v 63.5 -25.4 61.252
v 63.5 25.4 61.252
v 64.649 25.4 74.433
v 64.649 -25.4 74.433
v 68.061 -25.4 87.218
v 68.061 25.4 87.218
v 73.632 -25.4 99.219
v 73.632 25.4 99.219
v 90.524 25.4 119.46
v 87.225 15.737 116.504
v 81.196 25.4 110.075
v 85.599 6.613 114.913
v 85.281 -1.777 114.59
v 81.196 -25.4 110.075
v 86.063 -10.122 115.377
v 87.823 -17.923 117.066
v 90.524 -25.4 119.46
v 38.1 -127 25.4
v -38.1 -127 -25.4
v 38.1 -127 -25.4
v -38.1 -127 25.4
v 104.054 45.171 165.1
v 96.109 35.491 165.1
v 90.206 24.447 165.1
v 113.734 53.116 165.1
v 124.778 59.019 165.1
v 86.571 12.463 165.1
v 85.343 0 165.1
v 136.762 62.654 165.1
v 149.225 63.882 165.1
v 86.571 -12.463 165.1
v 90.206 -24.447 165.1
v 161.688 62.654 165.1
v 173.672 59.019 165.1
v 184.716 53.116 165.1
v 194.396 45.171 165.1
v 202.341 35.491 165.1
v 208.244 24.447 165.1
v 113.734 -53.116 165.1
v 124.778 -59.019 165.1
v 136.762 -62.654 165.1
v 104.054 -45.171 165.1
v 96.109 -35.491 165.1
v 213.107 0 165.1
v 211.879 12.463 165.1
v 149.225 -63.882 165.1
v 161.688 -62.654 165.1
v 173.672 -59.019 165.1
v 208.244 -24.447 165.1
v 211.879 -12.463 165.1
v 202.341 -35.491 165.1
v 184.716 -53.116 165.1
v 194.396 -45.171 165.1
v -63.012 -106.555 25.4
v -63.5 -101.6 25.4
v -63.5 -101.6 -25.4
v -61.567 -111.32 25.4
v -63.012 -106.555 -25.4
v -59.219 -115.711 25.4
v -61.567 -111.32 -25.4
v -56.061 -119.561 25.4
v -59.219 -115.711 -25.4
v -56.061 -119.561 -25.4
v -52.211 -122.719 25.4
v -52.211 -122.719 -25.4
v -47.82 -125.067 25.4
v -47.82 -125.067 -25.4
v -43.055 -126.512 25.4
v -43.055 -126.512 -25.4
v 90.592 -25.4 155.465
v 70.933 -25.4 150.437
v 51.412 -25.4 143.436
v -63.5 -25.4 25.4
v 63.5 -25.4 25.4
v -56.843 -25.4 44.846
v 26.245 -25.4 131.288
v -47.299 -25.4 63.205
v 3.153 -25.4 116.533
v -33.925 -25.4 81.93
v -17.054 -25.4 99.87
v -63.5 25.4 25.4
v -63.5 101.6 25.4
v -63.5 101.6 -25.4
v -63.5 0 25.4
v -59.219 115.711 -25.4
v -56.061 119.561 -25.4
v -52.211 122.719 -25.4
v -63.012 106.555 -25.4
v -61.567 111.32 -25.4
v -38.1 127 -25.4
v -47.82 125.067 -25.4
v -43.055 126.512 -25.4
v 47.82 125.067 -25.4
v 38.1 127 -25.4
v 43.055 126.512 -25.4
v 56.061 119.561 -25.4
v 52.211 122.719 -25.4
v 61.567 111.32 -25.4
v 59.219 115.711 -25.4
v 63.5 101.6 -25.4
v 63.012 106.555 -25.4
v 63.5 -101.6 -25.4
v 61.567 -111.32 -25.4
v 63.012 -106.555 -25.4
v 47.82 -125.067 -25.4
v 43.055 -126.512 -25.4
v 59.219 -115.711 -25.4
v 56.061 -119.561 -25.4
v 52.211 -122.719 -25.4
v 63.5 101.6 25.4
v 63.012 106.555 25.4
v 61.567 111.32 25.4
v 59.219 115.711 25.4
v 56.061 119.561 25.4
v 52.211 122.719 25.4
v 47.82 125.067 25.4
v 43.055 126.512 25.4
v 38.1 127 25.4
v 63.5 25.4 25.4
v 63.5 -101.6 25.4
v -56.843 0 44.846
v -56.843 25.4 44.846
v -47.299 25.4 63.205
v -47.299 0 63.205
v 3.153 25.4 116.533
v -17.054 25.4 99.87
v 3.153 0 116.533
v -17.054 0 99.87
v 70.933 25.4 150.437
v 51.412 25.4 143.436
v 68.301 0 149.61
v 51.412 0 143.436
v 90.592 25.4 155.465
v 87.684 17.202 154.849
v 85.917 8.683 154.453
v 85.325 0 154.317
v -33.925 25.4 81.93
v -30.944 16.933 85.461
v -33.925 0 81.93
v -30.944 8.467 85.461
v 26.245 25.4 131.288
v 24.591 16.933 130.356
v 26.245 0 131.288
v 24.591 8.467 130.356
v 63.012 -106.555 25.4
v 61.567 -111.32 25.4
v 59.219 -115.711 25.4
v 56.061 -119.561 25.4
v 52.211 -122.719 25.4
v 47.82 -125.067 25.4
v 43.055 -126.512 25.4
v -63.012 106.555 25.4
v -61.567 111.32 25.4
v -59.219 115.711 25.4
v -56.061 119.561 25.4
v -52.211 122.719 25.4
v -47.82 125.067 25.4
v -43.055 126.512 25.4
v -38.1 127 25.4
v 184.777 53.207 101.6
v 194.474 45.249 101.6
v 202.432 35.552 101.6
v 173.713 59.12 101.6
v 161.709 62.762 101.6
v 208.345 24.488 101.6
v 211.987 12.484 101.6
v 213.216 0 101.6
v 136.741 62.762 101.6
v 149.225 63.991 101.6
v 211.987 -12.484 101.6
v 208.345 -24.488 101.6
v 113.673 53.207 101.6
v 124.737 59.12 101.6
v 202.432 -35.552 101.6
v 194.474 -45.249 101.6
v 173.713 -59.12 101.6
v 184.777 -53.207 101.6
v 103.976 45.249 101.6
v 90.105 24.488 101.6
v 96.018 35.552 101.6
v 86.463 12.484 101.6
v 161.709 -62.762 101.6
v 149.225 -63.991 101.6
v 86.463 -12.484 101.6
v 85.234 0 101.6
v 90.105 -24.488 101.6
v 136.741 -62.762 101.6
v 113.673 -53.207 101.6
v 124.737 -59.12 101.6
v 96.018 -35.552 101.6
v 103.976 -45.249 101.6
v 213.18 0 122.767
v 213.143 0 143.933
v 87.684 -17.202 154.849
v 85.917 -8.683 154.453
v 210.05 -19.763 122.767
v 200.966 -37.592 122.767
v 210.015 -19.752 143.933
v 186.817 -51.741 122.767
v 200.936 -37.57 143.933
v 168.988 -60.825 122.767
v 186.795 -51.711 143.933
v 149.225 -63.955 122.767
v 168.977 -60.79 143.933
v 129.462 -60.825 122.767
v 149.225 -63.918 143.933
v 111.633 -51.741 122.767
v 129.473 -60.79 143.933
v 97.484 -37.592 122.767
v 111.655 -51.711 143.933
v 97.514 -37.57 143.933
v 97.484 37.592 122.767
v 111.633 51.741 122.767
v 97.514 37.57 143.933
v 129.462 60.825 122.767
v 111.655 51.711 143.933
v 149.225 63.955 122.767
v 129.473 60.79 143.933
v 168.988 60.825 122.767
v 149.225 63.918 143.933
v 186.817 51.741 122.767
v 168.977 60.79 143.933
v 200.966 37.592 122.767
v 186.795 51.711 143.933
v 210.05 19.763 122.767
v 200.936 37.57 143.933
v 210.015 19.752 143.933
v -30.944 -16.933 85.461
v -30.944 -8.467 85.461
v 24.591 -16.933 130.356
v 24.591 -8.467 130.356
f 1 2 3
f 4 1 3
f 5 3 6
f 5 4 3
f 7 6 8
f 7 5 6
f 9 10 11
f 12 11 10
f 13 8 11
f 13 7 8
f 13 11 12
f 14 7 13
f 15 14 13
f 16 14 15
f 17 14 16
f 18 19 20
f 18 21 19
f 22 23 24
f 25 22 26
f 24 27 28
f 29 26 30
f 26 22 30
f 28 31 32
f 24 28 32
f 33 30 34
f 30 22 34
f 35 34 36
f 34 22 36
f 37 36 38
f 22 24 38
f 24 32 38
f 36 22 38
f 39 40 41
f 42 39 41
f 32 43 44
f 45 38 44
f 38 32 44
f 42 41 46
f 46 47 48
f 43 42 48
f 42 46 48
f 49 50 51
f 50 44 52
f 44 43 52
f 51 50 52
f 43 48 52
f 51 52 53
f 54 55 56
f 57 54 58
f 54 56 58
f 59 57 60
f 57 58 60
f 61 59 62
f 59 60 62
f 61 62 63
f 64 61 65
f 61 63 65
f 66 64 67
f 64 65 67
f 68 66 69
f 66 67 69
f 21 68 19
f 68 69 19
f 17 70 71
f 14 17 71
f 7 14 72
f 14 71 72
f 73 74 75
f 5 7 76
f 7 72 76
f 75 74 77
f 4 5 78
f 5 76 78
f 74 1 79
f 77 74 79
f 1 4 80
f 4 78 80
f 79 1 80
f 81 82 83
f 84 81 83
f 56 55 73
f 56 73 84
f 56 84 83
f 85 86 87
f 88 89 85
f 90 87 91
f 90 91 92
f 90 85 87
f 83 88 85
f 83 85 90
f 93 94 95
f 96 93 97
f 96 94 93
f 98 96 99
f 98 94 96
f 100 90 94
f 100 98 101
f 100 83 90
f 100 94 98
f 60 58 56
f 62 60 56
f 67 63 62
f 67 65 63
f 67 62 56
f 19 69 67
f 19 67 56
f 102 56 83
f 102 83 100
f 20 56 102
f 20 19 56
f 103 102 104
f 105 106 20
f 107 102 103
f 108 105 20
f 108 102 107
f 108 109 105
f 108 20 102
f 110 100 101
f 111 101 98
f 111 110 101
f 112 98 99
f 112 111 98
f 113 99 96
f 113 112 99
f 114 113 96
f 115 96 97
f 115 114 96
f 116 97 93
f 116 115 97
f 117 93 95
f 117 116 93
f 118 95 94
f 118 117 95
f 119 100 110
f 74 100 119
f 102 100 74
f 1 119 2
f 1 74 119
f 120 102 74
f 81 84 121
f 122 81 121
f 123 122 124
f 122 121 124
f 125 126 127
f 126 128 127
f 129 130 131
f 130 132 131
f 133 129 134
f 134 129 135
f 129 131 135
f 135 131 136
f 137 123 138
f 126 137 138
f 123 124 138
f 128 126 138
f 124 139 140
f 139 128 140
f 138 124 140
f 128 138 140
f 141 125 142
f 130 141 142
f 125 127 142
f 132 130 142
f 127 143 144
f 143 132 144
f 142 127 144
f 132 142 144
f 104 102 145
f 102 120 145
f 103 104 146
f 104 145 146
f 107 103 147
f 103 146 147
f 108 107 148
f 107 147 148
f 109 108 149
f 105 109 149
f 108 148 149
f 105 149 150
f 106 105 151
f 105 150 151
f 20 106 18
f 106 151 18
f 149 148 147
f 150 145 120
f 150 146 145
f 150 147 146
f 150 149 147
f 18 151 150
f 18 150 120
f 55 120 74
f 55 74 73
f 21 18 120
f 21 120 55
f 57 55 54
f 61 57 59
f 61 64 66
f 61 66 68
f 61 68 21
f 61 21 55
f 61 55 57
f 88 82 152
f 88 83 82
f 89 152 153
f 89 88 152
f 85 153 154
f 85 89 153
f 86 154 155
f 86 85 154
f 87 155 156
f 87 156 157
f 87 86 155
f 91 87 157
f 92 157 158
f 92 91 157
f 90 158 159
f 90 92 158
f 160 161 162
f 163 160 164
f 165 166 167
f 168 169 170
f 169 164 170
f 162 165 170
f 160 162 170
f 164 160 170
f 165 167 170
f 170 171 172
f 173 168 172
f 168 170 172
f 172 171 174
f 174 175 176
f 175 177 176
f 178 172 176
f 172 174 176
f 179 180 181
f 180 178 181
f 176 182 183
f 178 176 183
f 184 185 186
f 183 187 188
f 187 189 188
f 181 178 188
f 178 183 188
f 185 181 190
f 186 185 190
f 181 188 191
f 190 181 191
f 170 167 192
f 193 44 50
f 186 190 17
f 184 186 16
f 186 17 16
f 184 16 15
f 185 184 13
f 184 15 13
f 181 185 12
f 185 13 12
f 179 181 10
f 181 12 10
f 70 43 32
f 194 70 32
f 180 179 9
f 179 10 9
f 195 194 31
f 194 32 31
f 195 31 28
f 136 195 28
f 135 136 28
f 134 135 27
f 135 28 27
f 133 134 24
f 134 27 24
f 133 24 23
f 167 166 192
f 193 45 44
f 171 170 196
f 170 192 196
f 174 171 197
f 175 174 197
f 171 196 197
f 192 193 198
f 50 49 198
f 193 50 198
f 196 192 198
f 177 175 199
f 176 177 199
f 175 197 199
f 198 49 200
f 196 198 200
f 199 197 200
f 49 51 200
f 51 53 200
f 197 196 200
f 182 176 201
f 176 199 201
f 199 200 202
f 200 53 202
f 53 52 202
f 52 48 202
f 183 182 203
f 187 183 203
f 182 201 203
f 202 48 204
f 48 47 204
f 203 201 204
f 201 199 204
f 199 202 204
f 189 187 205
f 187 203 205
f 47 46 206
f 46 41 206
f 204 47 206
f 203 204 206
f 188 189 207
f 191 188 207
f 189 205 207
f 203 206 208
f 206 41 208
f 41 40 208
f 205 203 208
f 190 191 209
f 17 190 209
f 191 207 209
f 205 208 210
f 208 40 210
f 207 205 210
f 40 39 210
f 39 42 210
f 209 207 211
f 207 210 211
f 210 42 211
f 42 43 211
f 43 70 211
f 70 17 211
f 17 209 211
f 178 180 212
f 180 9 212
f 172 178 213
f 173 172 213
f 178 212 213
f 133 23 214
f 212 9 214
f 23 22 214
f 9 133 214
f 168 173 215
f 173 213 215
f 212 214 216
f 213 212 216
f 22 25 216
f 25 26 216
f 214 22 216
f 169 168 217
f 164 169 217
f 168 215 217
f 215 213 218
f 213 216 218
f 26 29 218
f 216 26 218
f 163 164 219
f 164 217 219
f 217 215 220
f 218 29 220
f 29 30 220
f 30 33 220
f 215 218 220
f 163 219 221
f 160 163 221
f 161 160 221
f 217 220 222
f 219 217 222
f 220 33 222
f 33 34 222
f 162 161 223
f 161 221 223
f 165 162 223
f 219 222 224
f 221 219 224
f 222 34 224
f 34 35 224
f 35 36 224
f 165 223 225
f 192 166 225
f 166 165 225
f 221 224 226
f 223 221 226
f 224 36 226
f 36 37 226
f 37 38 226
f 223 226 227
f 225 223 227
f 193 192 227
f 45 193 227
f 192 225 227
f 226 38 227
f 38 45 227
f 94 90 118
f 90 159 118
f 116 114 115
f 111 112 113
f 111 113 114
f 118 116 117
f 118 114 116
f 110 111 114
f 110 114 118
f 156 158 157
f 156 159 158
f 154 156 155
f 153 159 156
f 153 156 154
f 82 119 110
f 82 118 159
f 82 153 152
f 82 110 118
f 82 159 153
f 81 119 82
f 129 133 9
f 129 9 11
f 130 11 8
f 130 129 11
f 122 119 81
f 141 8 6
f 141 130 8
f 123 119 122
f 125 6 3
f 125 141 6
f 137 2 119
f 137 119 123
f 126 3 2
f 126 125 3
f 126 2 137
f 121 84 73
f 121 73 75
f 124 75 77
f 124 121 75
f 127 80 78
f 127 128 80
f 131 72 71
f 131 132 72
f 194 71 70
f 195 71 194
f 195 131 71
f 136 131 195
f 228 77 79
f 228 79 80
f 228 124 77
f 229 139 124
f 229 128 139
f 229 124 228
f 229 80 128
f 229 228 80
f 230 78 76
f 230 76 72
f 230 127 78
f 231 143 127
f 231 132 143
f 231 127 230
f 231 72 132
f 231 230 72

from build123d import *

# Parameters (mm, degrees)
F1_DEPTH = 127
F2_DEPTH = 25.4
F4_R     = 25.4


with BuildPart() as f1:
    # F0 (on Front) → F1 (new body, symmetric)
    with BuildSketch(Plane.XZ):
        Polygon((42.44389, 25.4), (-63.5, 25.4), (-63.5, -25.4), (63.5, -25.4), (63.5, 25.4), align=None)
    extrude(amount=F1_DEPTH, both=True)

    # F0 (on Front) → F2 (join, symmetric)
    with BuildSketch(Plane.XZ):
        with BuildLine():
            add(Edge.make_bspline(
                [(-63.5, 25.4), (-42.358271, 108.126874), (62.167687, 166.074246), (139.7, 158.507851)],
                knots=[0, 0, 0, 0, 242.9155, 242.9155, 242.9155, 242.9155], degree=3))
            Line((-63.5, 25.4), (42.44389, 25.4))
            Line((42.44389, 25.4), (42.44389, 61.251742))
            ThreePointArc((42.44389, 61.251742), (70.929545, 130.022196), (139.7, 158.507851))
        make_face()
        with BuildLine():
            Line((42.44389, 61.251742), (42.44389, 25.4))
            Line((42.44389, 25.4), (63.5, 25.4))
            Line((63.5, 25.4), (63.5, 61.251742))
            ThreePointArc((63.5, 61.251742), (85.818463, 115.133278), (139.7, 137.451742))
            Line((139.7, 137.451742), (149.225, 137.451742))
            Line((149.225, 137.451742), (149.225, 158.507851))
            Line((149.225, 158.507851), (139.7, 158.507851))
            ThreePointArc((139.7, 158.507851), (70.929545, 130.022196), (42.44389, 61.251742))
        make_face()
    extrude(amount=F2_DEPTH, both=True)

    # F0 (on Front) → F3 (revolve)
    with BuildSketch(Plane.XZ):
        Polygon((149.225, 165.1), (149.225, 158.507851), (149.225, 137.451742), (149.225, 101.6), (213.216364, 101.6), (213.1069, 165.1), align=None)
    revolve(axis=Axis((149.225, 0, 133.35), (0, 0, -1)))

    # F4
    f4_edges = [f1.edges().sort_by_distance(p)[0] for p in [
        (63.5, -127, 0),
        (-63.5, -127, 0),
        (63.5, 127, 0),
        (-63.5, 127, 0),
    ]]
    fillet(f4_edges, radius=F4_R)


solid = f1.part
